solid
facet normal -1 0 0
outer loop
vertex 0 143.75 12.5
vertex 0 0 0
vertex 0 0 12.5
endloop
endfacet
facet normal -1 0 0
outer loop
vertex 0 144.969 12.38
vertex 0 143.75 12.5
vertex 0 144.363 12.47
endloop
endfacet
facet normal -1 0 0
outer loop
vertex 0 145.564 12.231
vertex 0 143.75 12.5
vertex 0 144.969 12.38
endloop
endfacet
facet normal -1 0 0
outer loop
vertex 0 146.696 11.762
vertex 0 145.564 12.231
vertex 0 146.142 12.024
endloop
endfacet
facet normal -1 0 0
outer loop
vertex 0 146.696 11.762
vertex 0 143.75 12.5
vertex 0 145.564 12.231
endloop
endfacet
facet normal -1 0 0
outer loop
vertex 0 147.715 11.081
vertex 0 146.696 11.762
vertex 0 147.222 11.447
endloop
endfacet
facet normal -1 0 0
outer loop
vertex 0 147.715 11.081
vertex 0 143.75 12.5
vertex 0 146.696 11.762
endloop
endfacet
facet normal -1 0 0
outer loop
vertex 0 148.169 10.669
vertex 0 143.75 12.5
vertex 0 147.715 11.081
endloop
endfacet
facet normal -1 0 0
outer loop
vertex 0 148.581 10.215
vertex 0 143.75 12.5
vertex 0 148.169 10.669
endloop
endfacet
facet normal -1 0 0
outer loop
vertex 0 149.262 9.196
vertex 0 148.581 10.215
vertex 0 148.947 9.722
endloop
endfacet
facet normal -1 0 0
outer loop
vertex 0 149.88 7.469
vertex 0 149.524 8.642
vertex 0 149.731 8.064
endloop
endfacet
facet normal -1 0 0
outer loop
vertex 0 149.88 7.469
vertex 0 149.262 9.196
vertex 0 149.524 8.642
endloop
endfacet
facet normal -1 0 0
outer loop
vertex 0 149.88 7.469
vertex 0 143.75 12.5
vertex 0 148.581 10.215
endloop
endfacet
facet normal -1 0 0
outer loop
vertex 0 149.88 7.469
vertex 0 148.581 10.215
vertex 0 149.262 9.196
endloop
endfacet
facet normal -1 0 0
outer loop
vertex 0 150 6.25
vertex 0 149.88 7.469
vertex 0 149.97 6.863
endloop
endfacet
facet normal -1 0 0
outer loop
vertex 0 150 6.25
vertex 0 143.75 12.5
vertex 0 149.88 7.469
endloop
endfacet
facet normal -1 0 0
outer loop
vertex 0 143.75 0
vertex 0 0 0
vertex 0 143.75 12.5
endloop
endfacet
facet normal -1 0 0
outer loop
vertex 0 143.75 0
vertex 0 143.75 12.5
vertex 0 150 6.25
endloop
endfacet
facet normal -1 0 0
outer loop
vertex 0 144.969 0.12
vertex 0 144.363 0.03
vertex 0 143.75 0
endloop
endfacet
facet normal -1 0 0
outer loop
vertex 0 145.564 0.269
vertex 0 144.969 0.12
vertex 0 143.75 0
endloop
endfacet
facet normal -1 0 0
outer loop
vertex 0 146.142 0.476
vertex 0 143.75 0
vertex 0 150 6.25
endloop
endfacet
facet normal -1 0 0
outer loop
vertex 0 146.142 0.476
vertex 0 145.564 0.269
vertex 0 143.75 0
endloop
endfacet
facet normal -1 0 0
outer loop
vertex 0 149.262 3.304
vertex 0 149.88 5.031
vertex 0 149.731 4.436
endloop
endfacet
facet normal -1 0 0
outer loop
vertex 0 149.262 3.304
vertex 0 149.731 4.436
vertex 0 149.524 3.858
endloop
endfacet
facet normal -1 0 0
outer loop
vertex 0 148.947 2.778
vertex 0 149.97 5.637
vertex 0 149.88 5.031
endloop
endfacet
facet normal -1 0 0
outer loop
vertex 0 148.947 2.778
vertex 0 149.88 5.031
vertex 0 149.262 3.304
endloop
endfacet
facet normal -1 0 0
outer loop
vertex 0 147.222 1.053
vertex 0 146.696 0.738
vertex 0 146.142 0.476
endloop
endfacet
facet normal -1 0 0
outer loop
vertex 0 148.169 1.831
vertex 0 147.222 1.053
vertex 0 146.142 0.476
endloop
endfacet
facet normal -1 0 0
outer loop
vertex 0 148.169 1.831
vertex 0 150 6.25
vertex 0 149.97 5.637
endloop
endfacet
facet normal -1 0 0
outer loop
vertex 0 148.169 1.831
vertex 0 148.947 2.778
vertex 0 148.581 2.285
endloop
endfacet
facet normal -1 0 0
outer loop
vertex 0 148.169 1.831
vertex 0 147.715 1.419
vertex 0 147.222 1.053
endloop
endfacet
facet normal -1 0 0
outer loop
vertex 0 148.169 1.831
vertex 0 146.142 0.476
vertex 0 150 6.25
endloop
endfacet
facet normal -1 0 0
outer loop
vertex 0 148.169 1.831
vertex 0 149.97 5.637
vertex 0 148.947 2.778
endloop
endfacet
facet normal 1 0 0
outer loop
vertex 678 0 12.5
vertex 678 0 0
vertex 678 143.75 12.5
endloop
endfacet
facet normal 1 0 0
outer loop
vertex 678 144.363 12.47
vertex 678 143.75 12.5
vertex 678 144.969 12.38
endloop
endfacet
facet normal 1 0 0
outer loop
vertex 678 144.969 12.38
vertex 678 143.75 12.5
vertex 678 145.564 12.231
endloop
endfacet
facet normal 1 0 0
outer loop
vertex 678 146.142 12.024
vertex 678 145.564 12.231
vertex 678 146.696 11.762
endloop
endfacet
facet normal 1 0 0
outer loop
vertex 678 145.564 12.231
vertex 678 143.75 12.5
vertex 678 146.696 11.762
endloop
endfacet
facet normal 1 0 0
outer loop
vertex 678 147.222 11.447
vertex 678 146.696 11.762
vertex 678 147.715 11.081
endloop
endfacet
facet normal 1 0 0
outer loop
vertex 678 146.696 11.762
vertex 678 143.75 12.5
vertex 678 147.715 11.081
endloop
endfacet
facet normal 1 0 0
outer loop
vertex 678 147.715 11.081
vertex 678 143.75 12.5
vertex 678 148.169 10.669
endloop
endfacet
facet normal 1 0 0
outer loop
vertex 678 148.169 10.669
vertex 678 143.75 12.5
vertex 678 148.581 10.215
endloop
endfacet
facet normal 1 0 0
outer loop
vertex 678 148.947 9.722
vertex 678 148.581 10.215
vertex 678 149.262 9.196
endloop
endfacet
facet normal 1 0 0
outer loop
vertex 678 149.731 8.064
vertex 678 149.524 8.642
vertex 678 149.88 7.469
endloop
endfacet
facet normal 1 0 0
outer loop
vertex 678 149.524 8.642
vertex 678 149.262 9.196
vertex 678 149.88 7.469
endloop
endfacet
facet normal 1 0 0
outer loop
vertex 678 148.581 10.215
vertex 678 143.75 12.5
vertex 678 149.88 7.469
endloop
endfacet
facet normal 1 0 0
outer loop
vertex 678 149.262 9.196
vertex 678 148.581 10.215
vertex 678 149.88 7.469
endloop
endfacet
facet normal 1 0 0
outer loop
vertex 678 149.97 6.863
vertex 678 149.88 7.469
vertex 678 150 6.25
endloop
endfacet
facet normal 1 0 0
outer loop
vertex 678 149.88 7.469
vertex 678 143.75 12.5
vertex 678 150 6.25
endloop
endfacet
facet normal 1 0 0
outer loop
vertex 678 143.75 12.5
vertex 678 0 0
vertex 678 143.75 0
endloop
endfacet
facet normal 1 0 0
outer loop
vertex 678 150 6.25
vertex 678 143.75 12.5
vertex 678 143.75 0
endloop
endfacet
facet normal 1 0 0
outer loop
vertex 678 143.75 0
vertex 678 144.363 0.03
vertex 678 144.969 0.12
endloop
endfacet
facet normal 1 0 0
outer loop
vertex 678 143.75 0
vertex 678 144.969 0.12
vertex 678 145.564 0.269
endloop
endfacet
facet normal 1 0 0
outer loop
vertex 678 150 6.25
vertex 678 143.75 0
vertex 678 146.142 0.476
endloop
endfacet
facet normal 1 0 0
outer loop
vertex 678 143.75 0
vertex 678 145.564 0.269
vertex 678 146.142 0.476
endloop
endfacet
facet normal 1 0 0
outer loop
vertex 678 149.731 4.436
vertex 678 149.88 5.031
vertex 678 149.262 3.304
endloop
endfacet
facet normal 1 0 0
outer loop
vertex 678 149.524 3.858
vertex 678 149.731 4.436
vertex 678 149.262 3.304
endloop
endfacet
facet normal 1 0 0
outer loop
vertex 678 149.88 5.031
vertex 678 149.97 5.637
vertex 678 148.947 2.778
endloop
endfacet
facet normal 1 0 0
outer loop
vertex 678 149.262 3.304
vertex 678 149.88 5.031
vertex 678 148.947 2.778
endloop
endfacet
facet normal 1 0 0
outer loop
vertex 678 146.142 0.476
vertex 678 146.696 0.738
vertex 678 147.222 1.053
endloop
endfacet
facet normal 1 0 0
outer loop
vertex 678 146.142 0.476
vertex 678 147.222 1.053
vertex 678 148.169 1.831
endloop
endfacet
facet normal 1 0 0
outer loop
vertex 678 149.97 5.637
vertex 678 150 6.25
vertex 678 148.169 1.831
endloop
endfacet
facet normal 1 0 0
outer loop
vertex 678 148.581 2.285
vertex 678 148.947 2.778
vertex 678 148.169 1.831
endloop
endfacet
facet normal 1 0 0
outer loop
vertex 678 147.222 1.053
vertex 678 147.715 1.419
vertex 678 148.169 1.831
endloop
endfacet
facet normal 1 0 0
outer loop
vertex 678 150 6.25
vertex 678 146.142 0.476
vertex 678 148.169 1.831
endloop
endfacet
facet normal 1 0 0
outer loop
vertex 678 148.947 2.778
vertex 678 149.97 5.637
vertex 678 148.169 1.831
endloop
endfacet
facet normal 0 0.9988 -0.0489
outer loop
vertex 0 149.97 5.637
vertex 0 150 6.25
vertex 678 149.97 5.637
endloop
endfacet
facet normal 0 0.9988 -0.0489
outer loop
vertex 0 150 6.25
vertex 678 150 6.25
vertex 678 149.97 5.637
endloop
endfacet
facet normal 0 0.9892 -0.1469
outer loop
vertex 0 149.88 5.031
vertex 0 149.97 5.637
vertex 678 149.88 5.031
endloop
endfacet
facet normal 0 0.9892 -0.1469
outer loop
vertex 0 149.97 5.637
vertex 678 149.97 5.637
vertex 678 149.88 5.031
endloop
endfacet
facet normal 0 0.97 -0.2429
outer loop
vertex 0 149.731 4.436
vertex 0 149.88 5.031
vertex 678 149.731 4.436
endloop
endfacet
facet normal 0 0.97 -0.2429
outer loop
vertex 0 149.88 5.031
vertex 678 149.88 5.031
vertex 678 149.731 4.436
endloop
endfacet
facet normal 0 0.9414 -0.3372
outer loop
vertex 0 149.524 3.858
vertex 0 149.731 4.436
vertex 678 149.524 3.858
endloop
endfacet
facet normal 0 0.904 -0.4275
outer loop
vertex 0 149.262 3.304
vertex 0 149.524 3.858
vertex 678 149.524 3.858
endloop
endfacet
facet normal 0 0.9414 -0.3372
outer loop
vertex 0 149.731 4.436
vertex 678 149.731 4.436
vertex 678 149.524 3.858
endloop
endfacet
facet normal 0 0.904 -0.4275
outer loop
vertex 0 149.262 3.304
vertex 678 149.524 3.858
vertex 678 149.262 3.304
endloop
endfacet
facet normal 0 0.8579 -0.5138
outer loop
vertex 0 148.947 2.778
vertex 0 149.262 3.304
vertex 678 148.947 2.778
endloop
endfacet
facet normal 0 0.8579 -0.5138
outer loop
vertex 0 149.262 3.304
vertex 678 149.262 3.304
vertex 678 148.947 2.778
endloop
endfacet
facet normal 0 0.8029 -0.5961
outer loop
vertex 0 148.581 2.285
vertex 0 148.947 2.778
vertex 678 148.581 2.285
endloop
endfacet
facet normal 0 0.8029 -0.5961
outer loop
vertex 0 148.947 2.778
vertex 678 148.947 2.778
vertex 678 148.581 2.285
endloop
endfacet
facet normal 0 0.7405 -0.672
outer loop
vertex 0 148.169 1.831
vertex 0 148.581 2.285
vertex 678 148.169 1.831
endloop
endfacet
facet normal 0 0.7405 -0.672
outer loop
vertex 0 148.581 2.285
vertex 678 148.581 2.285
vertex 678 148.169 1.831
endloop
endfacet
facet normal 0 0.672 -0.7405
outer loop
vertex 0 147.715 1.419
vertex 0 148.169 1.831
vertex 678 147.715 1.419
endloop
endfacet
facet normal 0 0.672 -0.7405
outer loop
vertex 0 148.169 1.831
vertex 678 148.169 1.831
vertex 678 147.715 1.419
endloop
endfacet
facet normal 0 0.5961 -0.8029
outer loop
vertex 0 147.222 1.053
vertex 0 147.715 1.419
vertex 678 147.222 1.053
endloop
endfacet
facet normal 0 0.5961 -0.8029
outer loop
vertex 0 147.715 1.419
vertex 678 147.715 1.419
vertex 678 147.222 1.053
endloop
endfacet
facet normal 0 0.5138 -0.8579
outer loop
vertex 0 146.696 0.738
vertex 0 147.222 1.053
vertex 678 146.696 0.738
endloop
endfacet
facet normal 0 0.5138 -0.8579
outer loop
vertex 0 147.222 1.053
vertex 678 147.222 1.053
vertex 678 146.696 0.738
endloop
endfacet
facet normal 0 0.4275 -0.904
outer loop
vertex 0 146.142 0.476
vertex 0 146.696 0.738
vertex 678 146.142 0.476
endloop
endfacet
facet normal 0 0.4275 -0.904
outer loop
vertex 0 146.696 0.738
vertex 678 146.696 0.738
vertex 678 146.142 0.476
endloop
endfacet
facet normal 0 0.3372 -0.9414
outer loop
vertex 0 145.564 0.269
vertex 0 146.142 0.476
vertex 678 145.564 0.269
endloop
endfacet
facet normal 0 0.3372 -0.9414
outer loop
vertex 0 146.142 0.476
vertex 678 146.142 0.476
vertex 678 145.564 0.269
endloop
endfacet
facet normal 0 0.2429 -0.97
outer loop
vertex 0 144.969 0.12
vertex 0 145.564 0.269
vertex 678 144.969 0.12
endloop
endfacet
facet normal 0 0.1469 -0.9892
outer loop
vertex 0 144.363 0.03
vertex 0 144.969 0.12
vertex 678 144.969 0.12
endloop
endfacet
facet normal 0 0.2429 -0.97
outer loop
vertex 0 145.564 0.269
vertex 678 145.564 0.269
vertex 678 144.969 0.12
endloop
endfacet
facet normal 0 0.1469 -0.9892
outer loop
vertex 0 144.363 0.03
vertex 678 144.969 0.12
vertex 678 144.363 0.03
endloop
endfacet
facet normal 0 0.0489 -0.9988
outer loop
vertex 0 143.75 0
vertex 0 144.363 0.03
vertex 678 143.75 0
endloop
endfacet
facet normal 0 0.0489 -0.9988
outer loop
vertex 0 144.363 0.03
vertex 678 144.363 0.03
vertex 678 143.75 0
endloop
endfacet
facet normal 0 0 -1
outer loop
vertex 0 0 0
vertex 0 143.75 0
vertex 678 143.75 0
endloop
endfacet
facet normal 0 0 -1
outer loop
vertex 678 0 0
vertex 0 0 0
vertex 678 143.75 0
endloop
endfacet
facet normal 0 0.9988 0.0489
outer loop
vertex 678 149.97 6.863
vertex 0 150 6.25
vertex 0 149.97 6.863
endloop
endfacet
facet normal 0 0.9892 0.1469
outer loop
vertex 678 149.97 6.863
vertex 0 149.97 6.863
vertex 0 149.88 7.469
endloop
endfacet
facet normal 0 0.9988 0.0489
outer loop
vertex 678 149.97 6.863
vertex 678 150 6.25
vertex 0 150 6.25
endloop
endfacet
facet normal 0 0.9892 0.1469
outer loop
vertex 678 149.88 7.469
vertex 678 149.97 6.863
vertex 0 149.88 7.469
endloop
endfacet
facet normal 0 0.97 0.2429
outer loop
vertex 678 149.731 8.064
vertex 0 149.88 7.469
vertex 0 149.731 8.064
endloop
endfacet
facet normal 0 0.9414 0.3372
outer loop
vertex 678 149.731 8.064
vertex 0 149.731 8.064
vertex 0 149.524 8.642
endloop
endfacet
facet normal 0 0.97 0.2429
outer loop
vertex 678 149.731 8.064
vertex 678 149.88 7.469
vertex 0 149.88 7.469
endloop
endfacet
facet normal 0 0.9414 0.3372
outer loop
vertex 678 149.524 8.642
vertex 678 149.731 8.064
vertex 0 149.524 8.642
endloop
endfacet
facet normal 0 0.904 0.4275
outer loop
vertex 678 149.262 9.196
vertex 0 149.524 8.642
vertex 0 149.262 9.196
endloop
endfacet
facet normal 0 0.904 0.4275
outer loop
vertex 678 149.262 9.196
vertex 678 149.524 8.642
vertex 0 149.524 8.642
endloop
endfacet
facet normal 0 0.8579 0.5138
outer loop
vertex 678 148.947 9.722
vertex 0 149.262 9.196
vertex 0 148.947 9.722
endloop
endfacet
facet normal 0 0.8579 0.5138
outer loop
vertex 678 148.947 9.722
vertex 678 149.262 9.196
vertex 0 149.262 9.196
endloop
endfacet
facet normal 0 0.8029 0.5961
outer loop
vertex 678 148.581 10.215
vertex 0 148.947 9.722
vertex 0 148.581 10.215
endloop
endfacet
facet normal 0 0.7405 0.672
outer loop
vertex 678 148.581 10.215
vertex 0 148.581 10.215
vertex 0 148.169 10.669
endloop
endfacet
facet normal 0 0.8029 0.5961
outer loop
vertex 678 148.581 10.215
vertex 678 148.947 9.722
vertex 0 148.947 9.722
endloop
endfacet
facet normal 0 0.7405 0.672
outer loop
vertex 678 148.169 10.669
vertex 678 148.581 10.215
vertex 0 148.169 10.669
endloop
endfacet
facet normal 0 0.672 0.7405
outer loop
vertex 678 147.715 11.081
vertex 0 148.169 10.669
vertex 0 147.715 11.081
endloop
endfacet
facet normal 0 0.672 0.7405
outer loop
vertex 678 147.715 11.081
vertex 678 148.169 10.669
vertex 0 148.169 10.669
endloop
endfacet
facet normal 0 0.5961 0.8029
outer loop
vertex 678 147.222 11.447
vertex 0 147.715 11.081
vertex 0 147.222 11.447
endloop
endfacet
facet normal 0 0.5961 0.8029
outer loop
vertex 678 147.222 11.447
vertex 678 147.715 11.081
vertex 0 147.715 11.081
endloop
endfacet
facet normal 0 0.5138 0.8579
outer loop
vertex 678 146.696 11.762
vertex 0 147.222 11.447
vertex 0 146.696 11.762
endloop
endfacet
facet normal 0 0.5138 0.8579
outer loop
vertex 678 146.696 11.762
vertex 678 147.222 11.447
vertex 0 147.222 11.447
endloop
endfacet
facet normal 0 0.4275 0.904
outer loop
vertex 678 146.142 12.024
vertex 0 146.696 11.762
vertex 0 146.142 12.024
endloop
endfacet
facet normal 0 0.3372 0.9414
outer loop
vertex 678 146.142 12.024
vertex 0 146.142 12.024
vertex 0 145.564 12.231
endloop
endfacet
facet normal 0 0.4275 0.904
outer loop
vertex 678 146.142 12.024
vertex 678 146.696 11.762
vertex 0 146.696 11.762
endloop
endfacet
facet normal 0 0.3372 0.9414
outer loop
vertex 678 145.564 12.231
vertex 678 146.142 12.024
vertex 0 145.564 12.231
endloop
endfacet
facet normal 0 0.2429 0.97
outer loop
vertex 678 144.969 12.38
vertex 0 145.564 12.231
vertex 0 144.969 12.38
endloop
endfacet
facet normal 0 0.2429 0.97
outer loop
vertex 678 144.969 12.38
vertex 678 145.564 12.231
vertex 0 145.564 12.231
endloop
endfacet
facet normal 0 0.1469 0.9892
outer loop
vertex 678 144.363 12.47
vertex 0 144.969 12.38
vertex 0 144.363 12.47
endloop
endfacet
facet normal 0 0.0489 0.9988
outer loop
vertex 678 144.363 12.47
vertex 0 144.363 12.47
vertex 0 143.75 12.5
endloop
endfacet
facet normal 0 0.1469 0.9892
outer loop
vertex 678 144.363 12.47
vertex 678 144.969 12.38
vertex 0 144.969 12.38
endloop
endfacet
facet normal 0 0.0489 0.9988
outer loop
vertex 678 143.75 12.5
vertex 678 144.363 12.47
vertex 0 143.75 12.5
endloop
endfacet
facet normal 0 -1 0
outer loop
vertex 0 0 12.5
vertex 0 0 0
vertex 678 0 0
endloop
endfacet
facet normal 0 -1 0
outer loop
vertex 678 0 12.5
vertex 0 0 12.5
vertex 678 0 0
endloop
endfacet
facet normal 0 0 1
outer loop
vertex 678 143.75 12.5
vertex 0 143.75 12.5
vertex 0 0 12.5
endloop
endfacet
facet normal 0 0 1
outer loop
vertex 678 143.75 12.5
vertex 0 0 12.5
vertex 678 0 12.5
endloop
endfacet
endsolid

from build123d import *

# Parameters (mm, degrees)
SKETCH_1_W      = 678
SKETCH_1_H      = 150
EXTRUDE_1_DEPTH = 12.5
FILLET_1_R      = 6.25
FILLET_2_R      = 6.25


with BuildPart() as part:
    # 草图1 → 凸台-拉伸1 (new body)
    with BuildSketch(Plane.XY):
        with Locations((339, 75)):
            Rectangle(SKETCH_1_W, SKETCH_1_H)
    extrude(amount=EXTRUDE_1_DEPTH)

    # 圆角1
    fillet_1_edges = [part.edges().sort_by_distance(p)[0] for p in [
        (339, 150, 12.5),
    ]]
    fillet(fillet_1_edges, radius=FILLET_1_R)

    # 圆角2
    fillet_2_edges = [part.edges().sort_by_distance(p)[0] for p in [
        (339, 150, 0),
    ]]
    fillet(fillet_2_edges, radius=FILLET_2_R - 0.0001)  # a hair under: the kernel refuses the full size


solid = part.part
